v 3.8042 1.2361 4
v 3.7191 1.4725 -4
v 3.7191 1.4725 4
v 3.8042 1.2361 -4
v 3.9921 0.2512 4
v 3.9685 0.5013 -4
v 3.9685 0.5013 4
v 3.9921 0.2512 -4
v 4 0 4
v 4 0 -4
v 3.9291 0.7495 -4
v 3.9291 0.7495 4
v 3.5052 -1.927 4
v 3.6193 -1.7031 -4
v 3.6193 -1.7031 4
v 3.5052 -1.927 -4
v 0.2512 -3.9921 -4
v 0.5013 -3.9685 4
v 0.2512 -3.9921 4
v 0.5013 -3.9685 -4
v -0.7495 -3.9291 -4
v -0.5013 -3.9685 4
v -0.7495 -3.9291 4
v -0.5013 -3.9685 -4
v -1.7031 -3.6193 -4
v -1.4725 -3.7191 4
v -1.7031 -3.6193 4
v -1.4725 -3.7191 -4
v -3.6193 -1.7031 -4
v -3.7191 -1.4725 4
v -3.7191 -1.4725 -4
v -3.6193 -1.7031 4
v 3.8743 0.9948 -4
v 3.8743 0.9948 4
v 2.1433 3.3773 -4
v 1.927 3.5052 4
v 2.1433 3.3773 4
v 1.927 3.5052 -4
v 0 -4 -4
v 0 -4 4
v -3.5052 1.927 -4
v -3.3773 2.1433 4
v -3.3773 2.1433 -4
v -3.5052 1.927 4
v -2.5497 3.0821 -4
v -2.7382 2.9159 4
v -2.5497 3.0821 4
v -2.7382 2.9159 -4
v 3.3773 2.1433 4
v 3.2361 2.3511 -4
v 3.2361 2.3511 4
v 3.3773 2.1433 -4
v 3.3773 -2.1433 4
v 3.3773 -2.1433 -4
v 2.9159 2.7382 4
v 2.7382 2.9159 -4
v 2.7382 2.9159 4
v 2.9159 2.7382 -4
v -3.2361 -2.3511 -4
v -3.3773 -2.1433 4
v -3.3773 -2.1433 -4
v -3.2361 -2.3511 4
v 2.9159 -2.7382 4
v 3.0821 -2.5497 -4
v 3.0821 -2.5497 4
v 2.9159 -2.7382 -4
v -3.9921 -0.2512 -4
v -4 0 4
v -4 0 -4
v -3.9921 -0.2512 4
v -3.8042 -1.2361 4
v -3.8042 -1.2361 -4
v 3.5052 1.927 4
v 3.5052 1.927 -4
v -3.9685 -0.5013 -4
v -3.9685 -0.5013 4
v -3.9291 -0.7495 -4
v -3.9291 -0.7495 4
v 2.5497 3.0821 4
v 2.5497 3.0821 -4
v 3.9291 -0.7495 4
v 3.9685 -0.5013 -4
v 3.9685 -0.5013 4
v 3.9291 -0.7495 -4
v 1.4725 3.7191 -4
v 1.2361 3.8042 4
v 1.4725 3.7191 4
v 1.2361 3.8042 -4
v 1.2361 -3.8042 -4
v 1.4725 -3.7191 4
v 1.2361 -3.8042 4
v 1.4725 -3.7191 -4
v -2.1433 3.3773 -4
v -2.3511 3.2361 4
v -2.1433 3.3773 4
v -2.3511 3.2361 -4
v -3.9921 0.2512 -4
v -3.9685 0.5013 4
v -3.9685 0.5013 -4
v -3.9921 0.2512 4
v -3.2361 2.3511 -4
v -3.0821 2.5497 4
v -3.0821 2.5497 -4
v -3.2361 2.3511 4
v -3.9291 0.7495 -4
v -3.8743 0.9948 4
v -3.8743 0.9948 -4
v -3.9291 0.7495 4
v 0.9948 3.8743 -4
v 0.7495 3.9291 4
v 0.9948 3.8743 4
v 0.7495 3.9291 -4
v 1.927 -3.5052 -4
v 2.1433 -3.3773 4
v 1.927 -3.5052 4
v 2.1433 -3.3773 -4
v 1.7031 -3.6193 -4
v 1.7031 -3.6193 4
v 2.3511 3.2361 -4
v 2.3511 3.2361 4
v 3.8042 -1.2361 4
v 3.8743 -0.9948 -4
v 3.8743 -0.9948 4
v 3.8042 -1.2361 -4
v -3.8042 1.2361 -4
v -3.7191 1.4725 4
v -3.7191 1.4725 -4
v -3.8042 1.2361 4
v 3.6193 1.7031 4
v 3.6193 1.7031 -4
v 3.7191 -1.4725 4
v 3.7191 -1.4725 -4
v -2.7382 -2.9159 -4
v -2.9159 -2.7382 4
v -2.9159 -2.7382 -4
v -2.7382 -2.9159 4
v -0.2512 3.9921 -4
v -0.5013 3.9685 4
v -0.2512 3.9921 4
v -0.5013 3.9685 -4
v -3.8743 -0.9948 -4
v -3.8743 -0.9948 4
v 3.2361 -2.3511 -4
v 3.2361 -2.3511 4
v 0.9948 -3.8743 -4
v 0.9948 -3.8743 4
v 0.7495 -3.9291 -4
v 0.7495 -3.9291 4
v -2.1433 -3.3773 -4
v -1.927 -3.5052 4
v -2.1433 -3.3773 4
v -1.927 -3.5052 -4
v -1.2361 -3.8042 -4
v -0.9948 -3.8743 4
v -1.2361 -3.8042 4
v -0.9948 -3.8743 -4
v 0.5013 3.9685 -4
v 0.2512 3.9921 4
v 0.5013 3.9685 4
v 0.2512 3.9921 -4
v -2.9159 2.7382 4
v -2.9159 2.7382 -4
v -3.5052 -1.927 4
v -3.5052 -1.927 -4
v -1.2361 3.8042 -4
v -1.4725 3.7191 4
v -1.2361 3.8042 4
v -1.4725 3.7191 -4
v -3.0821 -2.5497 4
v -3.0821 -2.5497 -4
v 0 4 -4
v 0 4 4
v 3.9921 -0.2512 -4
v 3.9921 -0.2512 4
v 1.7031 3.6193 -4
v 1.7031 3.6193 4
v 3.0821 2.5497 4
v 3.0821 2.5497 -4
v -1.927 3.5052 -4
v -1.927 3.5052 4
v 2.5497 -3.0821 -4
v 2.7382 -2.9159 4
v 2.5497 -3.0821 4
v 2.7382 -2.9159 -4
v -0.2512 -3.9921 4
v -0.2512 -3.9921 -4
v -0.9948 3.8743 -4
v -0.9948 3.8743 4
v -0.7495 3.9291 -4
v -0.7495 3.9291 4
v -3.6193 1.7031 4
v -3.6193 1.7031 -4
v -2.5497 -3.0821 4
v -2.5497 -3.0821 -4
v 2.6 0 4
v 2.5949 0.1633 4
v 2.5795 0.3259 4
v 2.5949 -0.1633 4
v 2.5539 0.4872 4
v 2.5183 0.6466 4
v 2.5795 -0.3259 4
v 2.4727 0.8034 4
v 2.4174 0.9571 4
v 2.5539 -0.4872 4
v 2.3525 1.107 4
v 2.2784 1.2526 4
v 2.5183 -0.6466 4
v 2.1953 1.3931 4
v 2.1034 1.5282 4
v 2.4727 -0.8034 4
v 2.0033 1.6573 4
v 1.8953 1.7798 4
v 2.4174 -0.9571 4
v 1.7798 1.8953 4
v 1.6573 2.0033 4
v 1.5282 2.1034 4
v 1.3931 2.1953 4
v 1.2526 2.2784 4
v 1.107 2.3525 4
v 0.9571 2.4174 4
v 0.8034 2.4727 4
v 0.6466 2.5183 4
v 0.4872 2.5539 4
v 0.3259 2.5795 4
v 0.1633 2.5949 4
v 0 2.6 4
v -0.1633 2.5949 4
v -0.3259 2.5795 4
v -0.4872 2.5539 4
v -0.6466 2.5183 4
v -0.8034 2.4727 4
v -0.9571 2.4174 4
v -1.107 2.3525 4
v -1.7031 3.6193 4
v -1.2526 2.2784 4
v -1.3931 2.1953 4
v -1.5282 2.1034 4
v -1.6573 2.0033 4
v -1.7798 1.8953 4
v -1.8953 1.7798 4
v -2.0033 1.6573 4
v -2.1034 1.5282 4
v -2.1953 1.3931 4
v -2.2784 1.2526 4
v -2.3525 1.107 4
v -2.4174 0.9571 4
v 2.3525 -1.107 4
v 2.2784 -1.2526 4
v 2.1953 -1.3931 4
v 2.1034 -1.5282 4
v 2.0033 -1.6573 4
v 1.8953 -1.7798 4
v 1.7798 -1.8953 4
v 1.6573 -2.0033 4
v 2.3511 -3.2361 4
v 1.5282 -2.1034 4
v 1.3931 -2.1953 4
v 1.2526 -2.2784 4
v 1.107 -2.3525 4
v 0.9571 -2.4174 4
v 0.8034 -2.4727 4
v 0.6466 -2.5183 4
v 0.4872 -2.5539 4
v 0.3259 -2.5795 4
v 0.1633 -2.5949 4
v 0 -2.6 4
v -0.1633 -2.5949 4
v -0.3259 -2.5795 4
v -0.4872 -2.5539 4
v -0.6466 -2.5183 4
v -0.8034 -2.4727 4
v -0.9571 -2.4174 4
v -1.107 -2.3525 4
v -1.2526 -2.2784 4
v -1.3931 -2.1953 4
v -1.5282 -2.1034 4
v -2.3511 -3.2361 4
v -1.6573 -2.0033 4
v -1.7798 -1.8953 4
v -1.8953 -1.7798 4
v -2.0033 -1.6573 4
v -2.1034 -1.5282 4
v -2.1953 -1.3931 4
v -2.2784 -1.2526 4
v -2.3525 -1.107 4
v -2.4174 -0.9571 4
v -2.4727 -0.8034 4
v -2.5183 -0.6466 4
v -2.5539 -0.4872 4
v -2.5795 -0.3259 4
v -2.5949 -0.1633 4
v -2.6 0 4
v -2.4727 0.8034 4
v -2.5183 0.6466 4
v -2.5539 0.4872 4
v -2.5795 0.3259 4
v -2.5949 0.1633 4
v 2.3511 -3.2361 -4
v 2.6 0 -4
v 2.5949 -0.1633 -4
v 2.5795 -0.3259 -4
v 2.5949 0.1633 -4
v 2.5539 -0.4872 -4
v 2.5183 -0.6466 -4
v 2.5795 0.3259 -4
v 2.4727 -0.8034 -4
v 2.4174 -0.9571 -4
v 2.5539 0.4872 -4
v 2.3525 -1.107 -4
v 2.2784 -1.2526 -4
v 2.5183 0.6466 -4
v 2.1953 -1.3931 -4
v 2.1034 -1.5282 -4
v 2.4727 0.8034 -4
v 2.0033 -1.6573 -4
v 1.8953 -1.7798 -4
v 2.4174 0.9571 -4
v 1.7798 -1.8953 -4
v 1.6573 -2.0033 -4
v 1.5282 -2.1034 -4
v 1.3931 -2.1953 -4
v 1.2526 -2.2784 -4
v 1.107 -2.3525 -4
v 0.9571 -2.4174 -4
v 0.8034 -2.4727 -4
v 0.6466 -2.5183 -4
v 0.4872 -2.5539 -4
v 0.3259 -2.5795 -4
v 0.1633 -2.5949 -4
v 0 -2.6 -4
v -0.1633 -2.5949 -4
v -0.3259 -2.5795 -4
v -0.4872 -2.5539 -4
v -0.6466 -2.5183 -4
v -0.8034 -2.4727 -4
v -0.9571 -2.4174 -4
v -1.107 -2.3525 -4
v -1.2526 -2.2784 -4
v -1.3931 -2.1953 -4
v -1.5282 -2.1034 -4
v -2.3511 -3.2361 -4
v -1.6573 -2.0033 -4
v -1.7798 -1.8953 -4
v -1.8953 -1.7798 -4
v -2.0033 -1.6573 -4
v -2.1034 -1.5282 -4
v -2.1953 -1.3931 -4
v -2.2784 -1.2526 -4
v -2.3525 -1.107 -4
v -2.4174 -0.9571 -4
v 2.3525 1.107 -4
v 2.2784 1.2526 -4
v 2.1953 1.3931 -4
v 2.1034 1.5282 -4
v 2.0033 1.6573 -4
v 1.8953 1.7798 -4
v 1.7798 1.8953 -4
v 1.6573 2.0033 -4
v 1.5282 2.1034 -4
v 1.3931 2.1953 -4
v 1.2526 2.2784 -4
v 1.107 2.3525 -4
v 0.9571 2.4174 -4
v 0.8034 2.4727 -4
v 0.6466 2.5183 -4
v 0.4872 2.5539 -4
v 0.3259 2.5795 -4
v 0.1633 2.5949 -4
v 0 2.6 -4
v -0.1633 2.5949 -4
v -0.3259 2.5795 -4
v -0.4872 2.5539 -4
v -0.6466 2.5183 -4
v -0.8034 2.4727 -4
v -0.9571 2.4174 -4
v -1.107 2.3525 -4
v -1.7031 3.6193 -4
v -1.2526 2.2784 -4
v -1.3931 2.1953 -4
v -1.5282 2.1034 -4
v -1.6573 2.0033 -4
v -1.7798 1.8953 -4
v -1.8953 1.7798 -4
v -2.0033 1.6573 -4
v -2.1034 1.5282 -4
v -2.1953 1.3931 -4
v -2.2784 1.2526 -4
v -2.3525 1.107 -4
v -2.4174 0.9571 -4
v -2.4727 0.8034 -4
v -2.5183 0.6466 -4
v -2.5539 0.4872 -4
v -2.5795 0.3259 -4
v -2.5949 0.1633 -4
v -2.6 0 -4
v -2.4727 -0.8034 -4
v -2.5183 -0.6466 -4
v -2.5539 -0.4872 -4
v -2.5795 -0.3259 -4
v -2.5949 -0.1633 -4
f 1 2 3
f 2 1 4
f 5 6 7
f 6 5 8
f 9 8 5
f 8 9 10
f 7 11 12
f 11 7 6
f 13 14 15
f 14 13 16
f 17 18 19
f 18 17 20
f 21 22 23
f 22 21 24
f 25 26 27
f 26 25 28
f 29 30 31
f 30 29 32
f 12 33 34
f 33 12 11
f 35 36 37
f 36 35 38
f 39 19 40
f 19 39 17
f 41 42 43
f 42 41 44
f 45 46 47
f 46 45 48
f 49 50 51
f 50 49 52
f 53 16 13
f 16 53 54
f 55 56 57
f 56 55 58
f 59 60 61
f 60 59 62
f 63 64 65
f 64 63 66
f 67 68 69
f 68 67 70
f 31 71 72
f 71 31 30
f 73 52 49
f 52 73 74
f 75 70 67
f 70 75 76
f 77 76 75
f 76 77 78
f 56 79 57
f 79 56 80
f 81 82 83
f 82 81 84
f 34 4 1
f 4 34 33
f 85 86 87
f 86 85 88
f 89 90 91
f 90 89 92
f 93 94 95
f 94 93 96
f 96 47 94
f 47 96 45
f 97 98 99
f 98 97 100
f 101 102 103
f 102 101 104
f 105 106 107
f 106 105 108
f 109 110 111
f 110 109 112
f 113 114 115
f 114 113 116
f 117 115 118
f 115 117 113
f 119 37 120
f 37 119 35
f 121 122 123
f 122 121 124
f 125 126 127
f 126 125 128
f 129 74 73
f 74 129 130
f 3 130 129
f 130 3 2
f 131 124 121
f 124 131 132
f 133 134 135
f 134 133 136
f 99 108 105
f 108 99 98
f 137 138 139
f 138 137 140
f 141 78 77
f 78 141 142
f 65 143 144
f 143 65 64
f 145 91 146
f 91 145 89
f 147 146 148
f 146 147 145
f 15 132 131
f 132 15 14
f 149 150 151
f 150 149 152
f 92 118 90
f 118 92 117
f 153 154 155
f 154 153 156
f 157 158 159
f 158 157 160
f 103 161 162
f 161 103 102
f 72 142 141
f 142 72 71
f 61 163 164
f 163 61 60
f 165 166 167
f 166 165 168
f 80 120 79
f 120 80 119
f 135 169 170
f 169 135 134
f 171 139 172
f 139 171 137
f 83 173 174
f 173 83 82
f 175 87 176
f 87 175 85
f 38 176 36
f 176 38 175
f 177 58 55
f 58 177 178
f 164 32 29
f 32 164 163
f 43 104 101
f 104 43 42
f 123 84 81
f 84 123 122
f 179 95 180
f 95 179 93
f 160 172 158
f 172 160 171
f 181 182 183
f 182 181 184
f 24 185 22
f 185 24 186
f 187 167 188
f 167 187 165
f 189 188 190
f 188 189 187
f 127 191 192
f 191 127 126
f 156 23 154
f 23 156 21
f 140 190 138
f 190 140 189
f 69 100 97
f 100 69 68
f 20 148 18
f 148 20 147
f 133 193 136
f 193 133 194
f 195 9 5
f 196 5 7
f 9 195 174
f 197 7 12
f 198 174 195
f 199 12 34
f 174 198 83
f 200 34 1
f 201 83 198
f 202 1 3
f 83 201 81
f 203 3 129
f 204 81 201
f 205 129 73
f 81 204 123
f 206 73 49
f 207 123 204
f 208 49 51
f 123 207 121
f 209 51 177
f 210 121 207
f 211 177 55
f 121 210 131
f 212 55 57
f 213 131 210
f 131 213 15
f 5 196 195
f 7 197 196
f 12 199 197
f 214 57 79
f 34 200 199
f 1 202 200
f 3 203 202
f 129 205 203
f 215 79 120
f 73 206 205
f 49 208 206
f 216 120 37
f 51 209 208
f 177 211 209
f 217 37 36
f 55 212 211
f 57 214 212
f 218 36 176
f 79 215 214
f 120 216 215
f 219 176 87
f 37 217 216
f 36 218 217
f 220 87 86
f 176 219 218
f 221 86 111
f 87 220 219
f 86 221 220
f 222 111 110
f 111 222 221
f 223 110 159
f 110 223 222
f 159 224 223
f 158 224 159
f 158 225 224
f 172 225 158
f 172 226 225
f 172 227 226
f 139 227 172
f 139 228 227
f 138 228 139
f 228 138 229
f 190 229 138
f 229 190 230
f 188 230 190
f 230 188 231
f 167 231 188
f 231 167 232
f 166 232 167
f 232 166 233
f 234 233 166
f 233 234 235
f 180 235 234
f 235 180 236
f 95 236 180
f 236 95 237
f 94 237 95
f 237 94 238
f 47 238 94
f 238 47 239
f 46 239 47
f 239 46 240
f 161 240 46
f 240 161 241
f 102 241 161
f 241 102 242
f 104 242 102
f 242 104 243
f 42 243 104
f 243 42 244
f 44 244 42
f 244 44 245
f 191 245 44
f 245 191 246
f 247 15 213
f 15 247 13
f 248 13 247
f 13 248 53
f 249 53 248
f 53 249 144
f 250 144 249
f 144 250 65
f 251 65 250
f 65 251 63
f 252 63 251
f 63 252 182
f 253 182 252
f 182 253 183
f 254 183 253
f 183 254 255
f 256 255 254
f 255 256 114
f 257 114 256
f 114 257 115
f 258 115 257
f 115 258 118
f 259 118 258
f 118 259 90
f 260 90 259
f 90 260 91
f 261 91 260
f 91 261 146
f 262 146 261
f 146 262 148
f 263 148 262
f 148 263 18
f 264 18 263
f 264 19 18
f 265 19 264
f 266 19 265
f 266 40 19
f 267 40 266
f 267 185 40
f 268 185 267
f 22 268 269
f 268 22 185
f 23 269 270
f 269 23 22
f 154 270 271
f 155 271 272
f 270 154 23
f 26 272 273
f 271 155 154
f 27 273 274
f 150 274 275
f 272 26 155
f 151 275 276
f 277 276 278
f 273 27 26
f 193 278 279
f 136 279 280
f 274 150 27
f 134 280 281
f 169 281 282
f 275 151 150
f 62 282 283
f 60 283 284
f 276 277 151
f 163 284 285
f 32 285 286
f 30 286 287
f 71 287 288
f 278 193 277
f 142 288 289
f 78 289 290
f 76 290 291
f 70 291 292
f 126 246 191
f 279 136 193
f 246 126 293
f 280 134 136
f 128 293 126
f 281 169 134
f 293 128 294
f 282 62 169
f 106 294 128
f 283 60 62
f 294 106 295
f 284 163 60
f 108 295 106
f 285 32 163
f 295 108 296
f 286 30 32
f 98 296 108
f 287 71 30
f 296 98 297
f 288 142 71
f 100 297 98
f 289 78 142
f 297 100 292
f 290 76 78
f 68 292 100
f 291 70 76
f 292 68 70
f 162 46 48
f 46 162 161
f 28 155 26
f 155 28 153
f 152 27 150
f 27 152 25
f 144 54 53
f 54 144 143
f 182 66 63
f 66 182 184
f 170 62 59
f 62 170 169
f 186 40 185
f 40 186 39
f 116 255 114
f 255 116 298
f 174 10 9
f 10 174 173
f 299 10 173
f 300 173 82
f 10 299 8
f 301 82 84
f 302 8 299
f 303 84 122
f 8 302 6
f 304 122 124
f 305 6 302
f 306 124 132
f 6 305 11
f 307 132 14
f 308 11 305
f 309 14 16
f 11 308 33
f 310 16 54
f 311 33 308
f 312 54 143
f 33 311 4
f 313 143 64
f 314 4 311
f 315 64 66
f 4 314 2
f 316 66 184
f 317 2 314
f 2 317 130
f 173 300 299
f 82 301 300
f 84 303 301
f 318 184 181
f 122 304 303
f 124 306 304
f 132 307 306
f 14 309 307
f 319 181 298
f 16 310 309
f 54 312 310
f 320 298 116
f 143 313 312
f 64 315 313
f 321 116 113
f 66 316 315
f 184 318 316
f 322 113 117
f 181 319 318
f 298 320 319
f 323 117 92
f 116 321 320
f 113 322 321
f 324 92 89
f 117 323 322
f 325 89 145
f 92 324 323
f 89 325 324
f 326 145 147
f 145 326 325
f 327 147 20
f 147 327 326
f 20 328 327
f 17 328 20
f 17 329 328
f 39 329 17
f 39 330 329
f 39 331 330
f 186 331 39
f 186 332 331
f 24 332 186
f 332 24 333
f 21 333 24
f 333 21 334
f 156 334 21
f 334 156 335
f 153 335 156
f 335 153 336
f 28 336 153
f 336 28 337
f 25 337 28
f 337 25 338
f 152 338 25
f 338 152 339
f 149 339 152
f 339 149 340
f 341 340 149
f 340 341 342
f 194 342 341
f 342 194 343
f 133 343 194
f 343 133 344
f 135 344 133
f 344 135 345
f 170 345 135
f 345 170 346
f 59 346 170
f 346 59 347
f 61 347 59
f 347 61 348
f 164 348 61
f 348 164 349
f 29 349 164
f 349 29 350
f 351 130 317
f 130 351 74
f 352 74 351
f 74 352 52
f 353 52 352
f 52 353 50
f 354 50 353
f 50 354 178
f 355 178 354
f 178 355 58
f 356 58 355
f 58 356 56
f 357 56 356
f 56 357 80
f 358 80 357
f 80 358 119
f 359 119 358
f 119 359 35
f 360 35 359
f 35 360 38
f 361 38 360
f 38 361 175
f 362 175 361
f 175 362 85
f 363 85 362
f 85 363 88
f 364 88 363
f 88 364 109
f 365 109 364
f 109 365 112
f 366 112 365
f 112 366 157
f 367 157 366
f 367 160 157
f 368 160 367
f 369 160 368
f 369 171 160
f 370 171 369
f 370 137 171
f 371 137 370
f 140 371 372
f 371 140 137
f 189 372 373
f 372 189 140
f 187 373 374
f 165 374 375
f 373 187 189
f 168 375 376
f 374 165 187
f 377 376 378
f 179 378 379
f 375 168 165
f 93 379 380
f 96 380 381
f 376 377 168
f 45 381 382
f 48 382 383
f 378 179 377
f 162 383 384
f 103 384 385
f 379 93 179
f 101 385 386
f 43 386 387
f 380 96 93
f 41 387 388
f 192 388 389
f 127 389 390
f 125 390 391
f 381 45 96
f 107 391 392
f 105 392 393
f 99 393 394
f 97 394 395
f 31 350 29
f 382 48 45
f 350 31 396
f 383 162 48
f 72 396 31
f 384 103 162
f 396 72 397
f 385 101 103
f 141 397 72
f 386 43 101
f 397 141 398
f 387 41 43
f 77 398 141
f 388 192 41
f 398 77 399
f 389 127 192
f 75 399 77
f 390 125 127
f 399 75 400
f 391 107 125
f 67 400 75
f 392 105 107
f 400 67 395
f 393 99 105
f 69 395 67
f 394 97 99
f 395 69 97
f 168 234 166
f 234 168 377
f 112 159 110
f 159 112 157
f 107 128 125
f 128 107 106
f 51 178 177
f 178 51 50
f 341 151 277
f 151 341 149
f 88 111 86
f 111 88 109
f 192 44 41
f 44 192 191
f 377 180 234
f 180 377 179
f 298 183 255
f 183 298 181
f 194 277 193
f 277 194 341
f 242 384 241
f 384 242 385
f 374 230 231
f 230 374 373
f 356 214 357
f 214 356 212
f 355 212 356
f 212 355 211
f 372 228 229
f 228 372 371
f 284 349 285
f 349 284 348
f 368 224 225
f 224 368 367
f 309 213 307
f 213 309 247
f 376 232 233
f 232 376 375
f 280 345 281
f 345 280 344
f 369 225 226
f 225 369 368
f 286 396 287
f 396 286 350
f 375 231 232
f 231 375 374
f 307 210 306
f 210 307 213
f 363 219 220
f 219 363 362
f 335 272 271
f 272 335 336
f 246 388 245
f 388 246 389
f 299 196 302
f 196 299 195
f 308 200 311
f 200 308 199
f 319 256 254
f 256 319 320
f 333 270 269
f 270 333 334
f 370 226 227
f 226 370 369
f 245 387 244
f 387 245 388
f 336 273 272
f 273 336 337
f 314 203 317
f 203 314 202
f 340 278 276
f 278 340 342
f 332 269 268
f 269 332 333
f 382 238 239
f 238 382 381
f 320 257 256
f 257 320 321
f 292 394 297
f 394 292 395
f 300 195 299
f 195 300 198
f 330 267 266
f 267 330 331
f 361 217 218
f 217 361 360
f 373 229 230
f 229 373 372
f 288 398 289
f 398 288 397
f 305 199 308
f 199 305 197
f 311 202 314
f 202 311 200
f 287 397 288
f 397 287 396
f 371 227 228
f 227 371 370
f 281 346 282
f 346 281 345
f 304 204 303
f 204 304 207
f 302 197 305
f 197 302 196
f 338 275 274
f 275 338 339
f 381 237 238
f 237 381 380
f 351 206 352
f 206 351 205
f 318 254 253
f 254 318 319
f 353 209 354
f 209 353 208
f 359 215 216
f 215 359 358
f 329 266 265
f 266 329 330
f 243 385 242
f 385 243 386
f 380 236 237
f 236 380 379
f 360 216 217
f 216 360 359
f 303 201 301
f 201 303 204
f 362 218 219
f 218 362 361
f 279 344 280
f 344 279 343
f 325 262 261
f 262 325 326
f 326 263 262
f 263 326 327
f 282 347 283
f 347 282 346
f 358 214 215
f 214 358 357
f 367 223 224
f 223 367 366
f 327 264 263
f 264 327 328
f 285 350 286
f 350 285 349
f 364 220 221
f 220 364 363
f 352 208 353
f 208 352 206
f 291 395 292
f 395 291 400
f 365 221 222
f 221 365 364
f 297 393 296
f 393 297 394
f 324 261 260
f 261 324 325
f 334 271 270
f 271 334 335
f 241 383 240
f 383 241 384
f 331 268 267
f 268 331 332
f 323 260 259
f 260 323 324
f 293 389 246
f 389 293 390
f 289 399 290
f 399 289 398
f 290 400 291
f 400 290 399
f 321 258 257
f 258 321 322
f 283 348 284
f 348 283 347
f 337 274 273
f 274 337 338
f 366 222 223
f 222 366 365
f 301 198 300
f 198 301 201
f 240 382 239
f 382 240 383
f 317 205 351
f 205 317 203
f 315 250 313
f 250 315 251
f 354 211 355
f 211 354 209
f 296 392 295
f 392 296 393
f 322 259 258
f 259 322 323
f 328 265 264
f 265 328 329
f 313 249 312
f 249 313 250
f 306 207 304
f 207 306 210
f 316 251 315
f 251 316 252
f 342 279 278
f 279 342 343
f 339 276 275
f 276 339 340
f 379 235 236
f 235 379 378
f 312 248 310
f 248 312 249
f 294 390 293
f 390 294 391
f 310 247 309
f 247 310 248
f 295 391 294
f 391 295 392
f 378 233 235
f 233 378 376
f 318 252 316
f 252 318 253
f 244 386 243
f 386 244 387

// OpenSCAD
$fn=40; // model faces resolution.

prumer_rotoru1=50;
vyska_rotoru1=5;
vyska_rotoru2=5;
prumer_sroubu=3.2;
vyska_matky=3;
sirka_matky=6;
prumer_orechu=10;
sila_materialu=3;
sila_materialu_vule=0.2;
hloubka_prekryti=2;

//lozisko
lozisko_prumer_vnitrni=5;
lozisko_prumer_vnejsi=16;
lozisko_vyska=5;
lozisko_prekryv=1.5;

//stator1
stator1_sila=2;

//stator1
sila_pod_loziskem=1;



//nastevní rotoru2
vyska_kryti=5;

//lopatka
hloubka_uchytu=20;
sila_uchytu=12;
vyska_uchytu=10;
tolerance_uchytu=0.1;


//rotor2
delka_hridele=5; //delka hridele koukající ve statoru





/*

difference()
{


//dotahovací kroužek
translate([0,0,0])
cylinder (h = sila_pod_loziskem+delka_hridele+2, r=(lozisko_prumer_vnitrni+2*lozisko_prekryv)/2, center = true, $fn=100);    
  
cylinder (h = sila_pod_loziskem+delka_hridele+2+0.1, r=((lozisko_prumer_vnitrni+0.2)/2), center = true, $fn=100);     
   
      
}
*/

difference()
{


//sehment pro sroub a magnet
translate([0,0,0])
cylinder (h = sila_pod_loziskem+delka_hridele+2, r=(lozisko_prumer_vnitrni+2*lozisko_prekryv)/2, center = true, $fn=100);    
  
cylinder (h = sila_pod_loziskem+delka_hridele+2+0.1, r=((lozisko_prumer_vnitrni+0.2)/2), center = true, $fn=100);     
   
      
}
